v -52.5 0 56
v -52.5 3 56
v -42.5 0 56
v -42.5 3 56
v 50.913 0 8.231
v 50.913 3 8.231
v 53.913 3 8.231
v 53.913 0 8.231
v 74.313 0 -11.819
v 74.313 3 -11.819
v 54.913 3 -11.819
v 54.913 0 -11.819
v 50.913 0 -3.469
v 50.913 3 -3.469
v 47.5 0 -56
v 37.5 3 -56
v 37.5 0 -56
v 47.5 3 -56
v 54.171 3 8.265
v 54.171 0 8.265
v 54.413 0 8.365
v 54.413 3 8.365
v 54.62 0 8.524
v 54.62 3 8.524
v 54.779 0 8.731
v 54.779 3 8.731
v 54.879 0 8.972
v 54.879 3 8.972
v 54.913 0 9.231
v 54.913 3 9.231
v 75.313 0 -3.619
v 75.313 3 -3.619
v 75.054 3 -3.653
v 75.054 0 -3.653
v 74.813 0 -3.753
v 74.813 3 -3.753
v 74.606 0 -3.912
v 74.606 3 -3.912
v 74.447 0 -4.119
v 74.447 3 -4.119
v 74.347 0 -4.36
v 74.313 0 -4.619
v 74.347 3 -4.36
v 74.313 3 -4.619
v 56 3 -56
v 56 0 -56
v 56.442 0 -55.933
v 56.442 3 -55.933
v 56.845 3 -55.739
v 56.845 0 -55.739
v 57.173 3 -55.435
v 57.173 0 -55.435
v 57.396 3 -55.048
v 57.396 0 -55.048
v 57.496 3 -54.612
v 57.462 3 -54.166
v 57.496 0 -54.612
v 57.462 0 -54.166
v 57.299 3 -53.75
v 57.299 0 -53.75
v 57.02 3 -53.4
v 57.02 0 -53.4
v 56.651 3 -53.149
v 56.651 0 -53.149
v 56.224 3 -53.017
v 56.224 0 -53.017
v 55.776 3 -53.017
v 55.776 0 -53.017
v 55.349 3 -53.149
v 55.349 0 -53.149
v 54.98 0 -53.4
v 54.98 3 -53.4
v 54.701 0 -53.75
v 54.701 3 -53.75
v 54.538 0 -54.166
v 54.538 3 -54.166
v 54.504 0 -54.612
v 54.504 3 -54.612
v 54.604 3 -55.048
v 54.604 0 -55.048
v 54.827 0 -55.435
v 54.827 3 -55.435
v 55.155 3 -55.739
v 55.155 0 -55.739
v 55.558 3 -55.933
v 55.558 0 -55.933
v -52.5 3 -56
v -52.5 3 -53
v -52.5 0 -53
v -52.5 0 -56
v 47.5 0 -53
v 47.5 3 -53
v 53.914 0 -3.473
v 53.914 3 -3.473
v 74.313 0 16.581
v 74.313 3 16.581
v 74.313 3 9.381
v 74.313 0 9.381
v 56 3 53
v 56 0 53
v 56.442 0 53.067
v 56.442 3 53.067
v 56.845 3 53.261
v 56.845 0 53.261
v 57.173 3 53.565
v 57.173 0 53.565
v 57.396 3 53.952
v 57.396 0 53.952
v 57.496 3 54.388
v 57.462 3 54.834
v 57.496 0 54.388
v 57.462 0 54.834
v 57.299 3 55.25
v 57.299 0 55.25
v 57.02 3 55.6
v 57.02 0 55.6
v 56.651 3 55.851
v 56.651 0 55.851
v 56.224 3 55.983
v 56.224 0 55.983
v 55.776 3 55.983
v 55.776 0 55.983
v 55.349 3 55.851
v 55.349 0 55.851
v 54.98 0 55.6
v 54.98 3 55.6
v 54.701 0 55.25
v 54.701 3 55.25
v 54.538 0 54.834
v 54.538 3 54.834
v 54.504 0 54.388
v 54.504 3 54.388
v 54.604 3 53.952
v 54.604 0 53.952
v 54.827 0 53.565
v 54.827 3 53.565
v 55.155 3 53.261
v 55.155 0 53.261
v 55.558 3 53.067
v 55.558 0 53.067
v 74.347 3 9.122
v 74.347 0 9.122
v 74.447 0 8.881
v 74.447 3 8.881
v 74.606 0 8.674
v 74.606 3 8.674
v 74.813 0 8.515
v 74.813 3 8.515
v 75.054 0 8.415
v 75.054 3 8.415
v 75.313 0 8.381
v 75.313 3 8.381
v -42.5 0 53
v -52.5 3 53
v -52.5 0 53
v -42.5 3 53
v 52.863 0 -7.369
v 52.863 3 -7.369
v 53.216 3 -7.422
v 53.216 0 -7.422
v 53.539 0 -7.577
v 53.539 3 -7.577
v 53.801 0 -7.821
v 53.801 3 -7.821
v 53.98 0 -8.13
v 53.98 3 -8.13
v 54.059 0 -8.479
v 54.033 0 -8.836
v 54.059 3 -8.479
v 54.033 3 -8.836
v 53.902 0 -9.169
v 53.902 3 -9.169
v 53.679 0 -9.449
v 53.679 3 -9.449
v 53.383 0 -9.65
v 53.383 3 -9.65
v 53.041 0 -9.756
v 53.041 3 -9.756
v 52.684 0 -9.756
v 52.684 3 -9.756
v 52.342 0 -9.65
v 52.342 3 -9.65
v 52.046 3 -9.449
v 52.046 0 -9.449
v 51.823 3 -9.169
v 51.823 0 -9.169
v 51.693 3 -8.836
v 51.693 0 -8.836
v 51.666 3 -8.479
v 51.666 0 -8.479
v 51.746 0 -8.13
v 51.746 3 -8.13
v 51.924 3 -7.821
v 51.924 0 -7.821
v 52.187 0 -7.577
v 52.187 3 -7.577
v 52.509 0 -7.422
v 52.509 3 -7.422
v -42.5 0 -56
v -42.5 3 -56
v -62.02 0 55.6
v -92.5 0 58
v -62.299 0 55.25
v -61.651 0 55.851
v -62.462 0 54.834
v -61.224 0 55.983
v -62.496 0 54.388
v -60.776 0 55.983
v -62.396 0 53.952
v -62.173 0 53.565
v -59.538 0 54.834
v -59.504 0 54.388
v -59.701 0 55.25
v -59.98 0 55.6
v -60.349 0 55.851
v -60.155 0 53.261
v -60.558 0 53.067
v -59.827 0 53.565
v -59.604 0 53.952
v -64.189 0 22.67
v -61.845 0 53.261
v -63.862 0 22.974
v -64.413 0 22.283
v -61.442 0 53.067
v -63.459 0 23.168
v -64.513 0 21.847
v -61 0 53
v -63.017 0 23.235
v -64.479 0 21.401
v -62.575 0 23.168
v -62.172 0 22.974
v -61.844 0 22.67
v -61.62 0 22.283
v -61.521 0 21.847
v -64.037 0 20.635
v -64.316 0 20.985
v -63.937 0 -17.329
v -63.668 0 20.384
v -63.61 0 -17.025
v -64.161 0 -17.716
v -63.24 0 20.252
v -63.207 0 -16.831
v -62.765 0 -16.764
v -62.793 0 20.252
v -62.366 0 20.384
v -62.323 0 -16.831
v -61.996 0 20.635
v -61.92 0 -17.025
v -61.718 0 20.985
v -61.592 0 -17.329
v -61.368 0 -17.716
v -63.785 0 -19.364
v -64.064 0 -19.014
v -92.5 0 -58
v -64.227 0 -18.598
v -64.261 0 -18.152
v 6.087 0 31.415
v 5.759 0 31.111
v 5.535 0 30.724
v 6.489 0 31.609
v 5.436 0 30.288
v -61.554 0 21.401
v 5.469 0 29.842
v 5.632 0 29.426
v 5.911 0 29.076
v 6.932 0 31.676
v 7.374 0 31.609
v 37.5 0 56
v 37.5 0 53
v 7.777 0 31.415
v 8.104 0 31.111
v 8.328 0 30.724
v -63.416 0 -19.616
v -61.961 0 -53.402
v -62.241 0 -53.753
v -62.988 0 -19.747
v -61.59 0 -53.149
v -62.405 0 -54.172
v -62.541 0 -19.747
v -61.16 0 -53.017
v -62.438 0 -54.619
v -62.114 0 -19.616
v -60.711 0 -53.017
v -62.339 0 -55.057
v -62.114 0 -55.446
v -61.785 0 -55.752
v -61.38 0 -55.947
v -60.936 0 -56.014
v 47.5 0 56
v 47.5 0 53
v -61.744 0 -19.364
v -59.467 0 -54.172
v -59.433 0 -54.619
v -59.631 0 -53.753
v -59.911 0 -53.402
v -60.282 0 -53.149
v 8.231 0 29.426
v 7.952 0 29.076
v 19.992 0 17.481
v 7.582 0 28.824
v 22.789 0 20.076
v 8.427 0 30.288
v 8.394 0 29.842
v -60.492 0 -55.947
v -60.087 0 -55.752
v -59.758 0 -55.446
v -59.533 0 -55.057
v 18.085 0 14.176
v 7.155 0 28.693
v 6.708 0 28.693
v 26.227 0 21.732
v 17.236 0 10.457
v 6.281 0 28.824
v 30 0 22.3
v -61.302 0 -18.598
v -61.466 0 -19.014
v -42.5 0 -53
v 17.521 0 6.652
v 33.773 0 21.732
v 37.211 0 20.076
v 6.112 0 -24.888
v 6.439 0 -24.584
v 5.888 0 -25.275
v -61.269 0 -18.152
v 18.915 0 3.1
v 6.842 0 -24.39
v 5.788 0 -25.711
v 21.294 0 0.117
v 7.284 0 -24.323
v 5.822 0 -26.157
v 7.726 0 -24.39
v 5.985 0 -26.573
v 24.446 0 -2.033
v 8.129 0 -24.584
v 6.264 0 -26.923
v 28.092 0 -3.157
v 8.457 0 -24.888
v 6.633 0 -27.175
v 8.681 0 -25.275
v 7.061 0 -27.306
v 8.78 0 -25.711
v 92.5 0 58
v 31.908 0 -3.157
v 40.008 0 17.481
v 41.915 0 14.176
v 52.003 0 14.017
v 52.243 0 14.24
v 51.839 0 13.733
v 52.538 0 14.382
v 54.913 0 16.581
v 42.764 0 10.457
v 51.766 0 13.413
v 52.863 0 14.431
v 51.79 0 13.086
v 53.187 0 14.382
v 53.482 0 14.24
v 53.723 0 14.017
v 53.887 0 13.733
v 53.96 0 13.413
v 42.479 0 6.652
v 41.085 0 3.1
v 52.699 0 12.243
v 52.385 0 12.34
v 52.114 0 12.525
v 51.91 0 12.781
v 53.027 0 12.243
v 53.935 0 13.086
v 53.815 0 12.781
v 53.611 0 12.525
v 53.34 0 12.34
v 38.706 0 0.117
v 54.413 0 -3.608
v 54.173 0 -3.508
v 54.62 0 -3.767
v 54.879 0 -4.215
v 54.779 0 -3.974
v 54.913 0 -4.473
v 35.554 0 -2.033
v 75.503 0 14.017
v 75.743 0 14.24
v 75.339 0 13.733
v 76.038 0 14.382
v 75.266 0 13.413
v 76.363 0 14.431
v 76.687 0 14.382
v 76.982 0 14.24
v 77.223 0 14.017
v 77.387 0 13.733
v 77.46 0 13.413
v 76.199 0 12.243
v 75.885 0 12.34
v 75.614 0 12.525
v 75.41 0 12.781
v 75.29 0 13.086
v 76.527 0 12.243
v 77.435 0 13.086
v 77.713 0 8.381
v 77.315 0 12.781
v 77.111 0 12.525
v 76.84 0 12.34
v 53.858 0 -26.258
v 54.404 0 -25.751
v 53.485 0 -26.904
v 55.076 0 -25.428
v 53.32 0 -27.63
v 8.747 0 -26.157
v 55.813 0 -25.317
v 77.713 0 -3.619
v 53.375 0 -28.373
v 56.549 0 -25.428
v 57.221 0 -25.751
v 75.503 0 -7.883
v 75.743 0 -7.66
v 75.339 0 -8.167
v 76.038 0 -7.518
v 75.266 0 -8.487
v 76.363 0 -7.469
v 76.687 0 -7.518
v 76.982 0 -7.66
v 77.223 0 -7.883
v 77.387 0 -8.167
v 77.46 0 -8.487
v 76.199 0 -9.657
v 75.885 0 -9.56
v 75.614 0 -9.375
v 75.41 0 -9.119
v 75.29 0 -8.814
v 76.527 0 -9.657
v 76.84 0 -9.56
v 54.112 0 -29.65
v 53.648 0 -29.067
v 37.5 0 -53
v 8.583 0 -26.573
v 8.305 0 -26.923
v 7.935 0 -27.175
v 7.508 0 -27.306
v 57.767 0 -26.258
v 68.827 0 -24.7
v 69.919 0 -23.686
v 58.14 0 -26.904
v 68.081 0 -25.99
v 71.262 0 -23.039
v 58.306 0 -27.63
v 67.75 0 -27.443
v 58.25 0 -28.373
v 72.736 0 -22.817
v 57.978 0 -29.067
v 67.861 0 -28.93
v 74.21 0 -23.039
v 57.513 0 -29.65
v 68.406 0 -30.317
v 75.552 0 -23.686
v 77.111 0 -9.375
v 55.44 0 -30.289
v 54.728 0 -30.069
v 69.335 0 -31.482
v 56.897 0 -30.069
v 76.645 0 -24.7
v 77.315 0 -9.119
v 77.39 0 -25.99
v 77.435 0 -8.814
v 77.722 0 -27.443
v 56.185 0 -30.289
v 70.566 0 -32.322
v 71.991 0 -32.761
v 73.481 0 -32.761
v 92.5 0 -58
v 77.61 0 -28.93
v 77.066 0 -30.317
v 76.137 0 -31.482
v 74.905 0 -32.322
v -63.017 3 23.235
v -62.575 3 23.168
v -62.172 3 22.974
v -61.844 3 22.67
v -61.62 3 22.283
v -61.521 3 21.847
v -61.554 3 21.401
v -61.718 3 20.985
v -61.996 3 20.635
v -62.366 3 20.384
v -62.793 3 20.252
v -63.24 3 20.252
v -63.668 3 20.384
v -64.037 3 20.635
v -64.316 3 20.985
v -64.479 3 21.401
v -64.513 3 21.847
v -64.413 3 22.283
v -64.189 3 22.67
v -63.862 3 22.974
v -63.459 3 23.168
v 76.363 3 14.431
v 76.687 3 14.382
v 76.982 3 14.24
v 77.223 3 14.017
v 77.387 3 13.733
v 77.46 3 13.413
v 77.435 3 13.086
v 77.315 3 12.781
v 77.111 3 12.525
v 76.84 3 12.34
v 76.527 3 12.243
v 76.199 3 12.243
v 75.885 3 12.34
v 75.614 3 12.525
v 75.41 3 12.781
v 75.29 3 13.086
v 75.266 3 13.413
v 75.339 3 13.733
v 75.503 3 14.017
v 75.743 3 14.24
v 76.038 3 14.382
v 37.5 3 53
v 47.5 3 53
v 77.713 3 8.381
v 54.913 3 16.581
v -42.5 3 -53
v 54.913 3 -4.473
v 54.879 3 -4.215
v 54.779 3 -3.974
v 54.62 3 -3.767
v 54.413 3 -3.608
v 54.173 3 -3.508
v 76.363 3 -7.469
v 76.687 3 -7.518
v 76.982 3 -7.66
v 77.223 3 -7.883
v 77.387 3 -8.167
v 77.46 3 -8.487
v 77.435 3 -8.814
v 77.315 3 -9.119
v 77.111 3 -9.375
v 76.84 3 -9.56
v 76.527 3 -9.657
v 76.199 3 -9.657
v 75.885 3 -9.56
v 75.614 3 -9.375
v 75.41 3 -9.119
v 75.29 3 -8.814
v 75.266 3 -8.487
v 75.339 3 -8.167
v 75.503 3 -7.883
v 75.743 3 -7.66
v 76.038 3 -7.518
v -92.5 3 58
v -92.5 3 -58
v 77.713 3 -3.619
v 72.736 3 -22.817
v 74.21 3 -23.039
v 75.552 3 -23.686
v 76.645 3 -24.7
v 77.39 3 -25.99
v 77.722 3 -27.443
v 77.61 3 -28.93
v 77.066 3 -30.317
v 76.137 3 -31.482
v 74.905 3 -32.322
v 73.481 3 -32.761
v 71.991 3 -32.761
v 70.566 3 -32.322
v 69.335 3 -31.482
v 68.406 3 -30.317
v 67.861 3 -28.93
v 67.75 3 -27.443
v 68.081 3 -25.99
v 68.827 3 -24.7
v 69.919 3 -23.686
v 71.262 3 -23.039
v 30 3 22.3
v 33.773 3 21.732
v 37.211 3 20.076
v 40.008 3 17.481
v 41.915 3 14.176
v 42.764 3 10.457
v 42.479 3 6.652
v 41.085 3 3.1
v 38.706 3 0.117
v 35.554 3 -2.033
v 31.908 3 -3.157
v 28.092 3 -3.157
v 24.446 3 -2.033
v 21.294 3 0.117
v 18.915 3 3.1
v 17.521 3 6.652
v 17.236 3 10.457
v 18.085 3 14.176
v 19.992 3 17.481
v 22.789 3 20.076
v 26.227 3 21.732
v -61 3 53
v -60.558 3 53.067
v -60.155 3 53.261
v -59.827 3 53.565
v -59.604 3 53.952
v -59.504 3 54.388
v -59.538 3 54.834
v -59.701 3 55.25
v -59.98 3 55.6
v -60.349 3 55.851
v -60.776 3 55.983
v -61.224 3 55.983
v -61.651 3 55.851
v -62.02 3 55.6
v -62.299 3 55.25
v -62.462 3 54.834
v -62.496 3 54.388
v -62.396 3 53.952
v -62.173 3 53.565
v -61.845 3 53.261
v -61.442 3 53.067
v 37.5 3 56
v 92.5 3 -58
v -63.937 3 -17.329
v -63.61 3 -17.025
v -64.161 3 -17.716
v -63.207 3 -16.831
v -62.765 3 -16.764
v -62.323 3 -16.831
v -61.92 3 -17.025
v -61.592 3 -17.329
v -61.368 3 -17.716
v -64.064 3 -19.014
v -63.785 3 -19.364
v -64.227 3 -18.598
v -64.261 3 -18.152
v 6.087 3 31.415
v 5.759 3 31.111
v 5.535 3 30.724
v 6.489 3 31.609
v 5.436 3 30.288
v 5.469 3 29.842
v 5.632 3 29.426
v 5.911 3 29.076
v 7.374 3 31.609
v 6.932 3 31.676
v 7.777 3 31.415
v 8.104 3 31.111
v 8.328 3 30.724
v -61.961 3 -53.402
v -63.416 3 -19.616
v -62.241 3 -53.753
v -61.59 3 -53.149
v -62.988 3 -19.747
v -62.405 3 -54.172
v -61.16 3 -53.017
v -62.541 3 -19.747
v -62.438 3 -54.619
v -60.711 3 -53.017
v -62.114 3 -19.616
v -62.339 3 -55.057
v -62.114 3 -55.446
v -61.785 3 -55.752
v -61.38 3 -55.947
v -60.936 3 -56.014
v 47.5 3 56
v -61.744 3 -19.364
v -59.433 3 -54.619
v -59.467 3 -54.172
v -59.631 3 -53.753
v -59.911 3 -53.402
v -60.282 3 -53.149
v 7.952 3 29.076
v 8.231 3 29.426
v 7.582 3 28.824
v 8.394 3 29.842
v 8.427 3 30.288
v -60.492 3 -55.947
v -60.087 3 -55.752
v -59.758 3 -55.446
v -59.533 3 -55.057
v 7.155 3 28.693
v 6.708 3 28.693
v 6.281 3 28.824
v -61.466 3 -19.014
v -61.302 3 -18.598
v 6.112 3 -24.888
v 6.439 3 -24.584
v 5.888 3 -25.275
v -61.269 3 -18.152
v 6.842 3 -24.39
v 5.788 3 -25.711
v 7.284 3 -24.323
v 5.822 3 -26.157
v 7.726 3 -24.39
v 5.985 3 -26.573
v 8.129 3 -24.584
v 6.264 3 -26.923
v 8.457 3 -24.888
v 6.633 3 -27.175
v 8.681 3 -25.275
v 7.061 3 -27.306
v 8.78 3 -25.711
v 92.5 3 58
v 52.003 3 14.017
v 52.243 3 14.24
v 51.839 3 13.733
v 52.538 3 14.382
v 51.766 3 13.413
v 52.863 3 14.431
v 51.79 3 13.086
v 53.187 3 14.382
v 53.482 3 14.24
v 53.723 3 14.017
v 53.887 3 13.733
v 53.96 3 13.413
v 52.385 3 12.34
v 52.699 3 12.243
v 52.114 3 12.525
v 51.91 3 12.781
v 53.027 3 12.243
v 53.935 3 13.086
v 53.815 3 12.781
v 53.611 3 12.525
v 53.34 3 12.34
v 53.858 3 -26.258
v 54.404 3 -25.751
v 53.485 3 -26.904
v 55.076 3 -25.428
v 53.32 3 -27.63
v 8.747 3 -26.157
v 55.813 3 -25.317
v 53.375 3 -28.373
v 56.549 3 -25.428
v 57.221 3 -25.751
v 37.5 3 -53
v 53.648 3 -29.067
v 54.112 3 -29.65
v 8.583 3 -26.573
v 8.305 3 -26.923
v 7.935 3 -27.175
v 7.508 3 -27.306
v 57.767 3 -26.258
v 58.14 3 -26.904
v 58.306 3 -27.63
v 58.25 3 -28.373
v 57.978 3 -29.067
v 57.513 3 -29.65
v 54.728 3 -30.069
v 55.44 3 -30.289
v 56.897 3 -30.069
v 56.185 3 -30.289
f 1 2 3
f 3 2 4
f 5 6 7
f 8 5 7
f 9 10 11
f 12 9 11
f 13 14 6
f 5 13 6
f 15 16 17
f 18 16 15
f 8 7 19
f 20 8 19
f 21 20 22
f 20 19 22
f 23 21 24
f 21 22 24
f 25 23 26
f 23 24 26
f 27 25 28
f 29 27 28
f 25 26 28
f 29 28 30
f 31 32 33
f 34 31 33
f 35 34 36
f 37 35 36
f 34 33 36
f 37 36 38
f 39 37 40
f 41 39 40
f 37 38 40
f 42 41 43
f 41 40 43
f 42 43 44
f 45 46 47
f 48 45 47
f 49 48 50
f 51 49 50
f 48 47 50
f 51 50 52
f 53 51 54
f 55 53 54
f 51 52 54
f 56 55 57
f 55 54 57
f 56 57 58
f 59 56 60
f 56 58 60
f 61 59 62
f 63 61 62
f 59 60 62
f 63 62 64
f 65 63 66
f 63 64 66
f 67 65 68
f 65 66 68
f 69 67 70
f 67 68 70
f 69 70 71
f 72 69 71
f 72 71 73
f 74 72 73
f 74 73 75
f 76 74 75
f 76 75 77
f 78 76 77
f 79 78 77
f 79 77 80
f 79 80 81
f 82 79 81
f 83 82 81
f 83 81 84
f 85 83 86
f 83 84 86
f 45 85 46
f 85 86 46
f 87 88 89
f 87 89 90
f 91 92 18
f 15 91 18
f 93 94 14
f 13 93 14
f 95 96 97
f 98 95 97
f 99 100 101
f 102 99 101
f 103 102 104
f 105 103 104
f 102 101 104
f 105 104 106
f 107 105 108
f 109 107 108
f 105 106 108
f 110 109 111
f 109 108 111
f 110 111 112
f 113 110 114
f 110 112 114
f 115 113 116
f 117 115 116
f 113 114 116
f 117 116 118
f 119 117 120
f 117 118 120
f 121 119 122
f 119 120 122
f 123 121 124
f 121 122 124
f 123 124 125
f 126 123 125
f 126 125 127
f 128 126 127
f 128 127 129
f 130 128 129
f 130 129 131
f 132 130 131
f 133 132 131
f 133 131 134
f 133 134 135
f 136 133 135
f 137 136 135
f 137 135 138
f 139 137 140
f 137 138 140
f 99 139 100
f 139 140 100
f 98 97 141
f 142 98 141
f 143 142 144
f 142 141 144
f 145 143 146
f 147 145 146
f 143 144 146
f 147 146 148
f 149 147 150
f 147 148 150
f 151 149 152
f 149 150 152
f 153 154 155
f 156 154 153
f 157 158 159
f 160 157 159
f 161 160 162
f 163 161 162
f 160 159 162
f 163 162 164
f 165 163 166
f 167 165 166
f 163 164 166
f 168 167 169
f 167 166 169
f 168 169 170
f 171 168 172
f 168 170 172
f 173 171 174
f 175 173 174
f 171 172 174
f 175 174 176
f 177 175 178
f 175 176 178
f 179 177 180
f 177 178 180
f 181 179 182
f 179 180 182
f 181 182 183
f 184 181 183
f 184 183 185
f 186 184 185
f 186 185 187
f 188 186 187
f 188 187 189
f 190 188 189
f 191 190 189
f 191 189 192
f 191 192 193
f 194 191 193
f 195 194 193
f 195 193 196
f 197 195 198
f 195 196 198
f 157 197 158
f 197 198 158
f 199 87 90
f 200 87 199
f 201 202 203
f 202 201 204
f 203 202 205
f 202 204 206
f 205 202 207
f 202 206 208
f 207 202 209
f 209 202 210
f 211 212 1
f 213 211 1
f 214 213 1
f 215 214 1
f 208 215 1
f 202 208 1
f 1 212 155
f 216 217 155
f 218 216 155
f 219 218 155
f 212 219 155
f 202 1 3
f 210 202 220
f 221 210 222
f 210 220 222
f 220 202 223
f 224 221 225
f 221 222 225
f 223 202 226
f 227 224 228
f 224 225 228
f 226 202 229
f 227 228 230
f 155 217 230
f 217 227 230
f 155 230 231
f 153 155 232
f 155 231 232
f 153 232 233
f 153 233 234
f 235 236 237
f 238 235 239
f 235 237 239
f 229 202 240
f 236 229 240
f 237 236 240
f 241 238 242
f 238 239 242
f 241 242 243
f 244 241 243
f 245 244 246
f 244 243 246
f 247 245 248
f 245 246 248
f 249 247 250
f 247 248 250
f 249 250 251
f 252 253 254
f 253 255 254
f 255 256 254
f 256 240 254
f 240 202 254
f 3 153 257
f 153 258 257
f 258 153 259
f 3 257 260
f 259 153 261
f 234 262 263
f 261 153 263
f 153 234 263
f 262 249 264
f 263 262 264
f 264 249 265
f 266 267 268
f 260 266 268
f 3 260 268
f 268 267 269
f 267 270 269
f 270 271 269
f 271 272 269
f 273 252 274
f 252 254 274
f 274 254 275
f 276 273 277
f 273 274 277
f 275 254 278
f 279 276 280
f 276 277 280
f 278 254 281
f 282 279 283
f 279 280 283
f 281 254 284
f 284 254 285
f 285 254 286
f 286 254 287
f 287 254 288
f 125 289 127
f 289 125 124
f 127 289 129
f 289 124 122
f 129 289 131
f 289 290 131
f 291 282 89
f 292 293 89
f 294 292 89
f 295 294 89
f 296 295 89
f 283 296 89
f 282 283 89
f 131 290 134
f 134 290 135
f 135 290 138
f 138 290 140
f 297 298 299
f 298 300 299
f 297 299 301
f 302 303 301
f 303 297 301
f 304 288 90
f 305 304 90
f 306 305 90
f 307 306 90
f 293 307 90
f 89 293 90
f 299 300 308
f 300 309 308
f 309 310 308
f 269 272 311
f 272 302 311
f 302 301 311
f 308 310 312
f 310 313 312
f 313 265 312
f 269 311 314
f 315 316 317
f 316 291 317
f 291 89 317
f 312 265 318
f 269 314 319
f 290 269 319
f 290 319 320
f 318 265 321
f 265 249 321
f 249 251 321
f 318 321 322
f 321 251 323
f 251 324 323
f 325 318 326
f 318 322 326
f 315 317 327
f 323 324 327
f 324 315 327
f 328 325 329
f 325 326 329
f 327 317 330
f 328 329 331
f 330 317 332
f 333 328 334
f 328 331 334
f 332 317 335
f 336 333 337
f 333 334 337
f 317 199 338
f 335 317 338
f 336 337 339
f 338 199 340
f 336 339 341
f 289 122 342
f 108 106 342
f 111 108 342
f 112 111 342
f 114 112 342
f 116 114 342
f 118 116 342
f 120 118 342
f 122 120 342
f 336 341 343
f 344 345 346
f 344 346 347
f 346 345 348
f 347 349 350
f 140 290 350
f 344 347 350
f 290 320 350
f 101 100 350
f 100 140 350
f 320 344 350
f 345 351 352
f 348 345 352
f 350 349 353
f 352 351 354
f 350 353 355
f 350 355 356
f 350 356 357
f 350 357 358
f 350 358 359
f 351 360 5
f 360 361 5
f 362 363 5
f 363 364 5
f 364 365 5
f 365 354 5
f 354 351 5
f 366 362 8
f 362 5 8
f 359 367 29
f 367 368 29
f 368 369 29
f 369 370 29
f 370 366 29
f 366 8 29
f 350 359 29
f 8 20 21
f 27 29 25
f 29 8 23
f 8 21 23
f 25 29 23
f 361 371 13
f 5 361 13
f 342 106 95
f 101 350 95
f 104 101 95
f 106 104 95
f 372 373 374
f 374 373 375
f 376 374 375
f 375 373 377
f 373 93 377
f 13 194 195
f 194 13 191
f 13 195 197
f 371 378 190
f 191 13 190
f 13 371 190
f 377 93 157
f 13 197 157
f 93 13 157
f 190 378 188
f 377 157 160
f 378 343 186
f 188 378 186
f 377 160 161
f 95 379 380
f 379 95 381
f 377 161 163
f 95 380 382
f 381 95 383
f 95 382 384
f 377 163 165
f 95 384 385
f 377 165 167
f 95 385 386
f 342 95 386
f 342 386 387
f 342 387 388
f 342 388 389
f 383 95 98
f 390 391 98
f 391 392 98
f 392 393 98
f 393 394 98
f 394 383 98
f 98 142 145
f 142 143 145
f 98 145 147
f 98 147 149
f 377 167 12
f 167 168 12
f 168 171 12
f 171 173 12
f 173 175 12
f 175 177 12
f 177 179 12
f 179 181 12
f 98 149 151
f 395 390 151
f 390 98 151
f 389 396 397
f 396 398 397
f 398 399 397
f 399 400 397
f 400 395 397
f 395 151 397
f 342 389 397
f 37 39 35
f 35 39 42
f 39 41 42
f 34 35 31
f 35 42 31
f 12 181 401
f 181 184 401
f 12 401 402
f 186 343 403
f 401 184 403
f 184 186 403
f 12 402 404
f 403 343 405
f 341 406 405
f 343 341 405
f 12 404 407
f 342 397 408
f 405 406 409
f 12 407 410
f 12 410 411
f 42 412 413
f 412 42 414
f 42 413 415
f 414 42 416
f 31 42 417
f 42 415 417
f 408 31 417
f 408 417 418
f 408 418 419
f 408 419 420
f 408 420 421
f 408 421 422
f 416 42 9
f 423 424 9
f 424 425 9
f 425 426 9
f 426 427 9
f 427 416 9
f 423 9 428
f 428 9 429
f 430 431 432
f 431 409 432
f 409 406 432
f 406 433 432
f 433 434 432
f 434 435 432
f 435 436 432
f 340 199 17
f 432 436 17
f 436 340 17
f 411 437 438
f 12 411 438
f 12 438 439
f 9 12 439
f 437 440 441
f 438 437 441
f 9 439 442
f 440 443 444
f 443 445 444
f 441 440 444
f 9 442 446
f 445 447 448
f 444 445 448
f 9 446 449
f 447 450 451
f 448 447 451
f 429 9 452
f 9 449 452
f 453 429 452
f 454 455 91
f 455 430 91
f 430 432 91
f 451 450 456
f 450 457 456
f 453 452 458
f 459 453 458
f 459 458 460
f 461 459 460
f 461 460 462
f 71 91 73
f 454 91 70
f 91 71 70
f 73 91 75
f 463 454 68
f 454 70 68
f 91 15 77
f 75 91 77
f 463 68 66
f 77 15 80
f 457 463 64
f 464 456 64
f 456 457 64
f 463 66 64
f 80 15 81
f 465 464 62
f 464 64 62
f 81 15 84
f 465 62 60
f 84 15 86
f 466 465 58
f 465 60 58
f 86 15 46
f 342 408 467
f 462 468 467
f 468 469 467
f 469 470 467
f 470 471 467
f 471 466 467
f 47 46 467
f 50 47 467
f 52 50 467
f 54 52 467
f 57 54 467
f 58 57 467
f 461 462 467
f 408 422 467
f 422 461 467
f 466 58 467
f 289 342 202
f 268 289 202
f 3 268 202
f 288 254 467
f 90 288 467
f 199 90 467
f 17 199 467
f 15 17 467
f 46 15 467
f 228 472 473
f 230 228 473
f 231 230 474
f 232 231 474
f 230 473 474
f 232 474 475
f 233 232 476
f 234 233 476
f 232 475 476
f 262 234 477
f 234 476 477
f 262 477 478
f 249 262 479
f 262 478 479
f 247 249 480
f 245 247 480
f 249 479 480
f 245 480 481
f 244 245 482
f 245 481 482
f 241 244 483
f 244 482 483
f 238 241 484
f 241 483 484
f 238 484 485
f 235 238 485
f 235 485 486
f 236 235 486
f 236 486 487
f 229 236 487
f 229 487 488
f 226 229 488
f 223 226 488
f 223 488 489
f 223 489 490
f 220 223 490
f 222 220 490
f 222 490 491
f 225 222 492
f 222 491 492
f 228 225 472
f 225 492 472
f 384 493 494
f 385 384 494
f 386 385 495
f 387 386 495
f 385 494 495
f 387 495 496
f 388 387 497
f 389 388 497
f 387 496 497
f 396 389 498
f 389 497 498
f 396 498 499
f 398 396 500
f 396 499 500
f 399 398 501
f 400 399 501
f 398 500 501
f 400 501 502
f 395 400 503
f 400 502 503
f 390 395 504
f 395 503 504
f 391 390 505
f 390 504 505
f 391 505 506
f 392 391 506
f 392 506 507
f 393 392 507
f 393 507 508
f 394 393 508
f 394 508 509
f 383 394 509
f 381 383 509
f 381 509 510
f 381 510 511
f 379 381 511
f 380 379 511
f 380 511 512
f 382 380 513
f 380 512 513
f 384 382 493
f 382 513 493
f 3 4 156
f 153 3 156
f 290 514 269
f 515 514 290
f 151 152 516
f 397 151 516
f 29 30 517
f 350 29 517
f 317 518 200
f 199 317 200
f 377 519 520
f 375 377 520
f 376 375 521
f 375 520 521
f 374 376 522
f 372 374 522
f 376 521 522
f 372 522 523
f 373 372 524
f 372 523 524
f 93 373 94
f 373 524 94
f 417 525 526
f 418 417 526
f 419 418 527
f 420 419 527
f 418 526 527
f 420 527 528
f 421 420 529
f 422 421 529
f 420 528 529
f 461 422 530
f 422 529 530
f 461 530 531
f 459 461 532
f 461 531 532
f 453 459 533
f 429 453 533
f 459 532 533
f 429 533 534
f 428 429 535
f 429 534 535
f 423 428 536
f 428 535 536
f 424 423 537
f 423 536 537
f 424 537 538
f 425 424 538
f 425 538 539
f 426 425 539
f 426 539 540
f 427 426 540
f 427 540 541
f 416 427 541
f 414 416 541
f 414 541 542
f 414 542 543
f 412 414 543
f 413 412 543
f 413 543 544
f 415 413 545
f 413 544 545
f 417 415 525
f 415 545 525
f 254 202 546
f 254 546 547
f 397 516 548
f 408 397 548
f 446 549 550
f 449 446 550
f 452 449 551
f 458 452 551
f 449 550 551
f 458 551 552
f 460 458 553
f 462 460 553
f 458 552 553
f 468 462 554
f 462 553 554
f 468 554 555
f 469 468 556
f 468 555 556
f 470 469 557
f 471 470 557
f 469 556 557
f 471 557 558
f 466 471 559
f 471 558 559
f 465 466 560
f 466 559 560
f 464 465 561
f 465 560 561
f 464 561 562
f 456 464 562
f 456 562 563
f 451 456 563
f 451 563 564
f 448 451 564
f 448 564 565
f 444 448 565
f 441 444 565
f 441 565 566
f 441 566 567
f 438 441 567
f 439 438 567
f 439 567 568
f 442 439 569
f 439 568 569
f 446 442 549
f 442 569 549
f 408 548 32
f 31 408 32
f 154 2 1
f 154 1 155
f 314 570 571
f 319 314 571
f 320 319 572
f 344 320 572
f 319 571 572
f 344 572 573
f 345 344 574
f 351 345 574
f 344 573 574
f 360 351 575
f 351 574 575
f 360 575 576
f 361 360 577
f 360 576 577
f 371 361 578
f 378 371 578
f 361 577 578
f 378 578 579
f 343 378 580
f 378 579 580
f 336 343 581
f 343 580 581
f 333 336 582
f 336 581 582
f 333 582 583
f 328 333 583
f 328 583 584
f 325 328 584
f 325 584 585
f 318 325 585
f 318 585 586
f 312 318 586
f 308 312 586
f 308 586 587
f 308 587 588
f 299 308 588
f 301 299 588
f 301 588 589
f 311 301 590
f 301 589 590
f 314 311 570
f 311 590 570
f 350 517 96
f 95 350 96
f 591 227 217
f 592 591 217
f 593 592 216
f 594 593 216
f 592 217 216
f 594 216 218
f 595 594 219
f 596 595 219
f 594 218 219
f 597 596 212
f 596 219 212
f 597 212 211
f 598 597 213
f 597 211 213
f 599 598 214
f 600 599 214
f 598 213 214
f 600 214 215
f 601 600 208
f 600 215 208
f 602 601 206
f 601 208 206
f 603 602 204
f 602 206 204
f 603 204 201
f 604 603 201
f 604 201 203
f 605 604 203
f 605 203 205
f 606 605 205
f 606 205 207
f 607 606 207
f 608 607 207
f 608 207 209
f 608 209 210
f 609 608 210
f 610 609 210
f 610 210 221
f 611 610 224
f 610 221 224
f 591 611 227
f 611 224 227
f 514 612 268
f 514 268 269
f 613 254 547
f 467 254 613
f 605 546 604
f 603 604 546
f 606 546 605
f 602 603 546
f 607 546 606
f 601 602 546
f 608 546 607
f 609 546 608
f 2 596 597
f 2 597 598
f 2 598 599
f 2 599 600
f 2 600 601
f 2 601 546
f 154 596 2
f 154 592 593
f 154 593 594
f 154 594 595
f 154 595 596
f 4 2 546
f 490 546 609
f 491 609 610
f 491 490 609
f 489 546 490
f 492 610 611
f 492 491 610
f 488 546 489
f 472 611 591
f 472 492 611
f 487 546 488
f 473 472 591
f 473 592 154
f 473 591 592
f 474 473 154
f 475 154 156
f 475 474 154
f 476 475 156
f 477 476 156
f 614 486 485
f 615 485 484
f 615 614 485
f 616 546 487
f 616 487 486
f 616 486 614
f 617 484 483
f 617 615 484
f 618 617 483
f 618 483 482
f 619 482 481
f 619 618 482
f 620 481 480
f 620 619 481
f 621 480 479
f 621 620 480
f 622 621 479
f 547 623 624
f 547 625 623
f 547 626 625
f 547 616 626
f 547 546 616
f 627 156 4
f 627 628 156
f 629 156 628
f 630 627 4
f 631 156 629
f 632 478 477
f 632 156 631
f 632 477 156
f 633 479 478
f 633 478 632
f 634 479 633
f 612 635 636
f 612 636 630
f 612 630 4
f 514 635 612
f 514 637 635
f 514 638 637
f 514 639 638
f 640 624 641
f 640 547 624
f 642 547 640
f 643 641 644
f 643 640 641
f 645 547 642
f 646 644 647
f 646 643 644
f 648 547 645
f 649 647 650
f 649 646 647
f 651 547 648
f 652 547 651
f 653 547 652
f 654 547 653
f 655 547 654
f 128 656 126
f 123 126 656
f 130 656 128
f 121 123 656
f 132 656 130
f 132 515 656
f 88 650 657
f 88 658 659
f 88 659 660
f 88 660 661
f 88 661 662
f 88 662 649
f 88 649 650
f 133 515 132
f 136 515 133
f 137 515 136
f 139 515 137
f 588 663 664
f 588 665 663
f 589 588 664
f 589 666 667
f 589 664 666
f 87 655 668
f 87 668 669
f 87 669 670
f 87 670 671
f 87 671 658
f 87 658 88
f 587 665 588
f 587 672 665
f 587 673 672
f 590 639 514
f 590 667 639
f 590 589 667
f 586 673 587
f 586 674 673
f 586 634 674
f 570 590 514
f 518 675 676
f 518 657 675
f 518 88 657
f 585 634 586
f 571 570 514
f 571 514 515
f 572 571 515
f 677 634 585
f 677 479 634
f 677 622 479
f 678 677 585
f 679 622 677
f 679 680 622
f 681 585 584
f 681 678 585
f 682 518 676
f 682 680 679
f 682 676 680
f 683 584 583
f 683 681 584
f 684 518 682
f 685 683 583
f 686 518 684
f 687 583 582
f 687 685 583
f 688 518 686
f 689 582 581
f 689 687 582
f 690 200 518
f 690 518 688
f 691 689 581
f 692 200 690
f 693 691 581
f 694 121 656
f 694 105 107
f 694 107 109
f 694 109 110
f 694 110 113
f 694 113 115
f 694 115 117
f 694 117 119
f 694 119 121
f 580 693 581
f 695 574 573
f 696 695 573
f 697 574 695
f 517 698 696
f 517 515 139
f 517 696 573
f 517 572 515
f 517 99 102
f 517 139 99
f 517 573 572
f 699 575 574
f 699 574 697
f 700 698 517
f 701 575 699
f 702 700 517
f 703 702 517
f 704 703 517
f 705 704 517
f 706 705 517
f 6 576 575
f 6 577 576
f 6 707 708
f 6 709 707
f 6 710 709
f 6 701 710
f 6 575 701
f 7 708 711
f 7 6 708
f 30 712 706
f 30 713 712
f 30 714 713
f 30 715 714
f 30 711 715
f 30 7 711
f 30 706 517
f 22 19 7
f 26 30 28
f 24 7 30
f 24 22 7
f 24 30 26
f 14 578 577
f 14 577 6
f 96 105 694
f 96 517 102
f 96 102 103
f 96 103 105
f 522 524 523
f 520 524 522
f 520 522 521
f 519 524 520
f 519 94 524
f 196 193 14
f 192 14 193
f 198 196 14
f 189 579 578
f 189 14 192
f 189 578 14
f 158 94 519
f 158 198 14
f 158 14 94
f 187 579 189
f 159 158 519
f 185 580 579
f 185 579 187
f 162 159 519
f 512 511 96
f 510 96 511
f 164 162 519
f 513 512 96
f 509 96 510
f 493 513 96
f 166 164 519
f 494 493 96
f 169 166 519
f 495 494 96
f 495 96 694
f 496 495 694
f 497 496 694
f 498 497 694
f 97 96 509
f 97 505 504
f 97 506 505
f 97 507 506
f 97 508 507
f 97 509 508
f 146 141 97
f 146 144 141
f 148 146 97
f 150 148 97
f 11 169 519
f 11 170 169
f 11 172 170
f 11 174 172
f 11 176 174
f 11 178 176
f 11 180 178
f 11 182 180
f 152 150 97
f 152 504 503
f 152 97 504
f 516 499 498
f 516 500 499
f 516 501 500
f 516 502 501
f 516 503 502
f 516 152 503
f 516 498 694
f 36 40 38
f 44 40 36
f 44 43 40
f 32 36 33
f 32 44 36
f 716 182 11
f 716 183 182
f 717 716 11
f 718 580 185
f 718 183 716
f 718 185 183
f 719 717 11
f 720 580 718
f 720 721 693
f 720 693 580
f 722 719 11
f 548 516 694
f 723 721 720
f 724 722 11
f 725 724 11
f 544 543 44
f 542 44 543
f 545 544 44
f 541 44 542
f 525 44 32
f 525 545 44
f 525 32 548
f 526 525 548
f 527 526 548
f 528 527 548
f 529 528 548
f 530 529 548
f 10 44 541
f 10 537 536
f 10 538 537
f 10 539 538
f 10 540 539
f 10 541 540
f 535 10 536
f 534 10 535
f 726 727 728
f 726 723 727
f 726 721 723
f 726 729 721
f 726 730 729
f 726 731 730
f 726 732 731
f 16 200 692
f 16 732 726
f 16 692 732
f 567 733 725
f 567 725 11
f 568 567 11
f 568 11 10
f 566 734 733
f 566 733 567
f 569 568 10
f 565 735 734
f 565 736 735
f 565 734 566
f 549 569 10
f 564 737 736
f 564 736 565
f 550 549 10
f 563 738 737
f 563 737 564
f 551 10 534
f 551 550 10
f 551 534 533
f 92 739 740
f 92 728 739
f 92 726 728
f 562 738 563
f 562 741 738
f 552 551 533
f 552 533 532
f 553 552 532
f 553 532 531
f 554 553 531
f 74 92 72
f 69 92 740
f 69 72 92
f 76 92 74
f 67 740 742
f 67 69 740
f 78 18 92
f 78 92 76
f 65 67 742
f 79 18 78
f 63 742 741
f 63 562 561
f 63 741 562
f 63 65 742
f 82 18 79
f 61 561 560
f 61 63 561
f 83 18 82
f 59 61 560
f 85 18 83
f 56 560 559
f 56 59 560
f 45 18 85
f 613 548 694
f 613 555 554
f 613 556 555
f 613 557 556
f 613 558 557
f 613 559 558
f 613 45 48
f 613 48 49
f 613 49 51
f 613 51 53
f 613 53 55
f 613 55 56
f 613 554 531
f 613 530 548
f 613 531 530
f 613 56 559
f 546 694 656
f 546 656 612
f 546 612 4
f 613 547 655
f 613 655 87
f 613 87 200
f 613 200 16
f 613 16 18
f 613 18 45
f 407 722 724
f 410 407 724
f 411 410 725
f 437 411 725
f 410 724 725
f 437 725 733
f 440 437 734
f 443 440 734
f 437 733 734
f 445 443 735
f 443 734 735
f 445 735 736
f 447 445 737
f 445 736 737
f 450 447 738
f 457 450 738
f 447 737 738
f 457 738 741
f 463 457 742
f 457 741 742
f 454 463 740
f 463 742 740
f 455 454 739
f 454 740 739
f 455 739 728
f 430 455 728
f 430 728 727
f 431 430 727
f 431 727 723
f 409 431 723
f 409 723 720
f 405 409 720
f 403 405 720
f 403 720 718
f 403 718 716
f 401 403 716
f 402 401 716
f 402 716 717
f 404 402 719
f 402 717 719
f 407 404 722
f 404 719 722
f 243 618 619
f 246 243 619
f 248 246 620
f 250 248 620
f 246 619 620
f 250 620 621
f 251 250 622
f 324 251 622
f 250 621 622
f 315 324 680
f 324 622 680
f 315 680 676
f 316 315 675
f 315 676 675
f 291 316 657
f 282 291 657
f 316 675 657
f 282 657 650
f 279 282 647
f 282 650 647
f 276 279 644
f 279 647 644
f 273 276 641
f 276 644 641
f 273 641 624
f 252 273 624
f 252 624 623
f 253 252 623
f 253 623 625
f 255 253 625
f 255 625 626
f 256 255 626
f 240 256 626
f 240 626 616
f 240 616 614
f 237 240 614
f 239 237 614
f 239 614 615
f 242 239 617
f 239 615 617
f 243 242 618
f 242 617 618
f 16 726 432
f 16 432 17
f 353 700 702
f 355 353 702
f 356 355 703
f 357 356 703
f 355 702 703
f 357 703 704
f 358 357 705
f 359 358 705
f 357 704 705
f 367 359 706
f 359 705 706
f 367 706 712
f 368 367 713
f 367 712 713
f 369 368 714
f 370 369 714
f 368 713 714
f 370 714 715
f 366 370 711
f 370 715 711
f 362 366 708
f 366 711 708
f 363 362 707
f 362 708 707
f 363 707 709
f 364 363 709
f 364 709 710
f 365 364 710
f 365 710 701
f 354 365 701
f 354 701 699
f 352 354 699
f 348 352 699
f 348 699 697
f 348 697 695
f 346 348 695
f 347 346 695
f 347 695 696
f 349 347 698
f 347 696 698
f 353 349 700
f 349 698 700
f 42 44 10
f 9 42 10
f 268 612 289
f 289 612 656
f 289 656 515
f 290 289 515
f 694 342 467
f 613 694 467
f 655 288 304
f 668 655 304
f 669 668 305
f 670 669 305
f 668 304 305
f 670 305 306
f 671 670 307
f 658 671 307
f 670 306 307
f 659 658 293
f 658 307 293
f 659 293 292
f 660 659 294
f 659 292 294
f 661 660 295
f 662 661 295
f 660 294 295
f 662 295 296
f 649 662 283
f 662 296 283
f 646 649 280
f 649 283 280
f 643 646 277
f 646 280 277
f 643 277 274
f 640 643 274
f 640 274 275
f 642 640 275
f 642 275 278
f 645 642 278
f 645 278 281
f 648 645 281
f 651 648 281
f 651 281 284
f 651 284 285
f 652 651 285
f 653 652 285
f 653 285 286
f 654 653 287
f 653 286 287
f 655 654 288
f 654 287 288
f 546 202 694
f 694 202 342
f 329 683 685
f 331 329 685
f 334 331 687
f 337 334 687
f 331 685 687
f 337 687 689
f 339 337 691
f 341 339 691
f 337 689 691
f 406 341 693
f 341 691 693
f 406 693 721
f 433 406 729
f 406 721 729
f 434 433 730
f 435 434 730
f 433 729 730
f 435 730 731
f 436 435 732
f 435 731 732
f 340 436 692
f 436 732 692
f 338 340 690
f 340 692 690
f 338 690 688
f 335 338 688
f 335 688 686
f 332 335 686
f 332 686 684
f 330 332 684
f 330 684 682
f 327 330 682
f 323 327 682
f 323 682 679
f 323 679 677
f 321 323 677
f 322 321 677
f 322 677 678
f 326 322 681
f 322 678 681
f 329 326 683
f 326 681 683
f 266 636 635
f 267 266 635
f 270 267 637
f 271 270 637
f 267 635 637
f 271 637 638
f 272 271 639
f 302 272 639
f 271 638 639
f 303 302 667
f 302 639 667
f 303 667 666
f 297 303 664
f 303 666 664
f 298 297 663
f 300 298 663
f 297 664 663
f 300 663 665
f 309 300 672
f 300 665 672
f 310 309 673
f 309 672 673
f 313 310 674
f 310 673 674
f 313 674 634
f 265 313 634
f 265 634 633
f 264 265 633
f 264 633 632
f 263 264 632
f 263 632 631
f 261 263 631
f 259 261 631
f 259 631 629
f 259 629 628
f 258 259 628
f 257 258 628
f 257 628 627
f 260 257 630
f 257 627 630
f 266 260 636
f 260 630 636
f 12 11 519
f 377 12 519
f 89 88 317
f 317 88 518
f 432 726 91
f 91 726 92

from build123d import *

# Parameters (mm, degrees)
SKETCH1_W           = 185
SKETCH1_H           = 116
BOSS_EXTRUDE1_DEPTH = 3
SKETCH8_R           = 1.5
CUT_EXTRUDE3_DEPTH  = 3
SKETCH10_R          = 1.2
SKETCH10_R_2        = 1.1
SKETCH10_R_3        = 2.5
SKETCH10_R_4        = 5
SKETCH10_R_5        = 12.80026957
CUT_EXTRUDE6_DEPTH  = 3
SKETCH11_W          = 10
SKETCH11_H          = 3
CUT_EXTRUDE7_DEPTH  = 3
SKETCH13_R          = 1.5
SKETCH13_R_2        = 1.506866353
CUT_EXTRUDE8_DEPTH  = 3


with BuildPart() as part:
    # Sketch1 → Boss-Extrude1 (new body)
    with BuildSketch(Plane(origin=(0, 0, 0), x_dir=(1, 0, 0), z_dir=(0, 1, 0))):
        Rectangle(SKETCH1_W, SKETCH1_H)
    extrude(amount=BOSS_EXTRUDE1_DEPTH)

    # Sketch8 → Cut-Extrude3 (cut)
    with BuildSketch(Plane(origin=(0, 3, 0), x_dir=(1, 0, 0), z_dir=(0, 1, 0))):
        with Locations(Location((-62.764720309, 18.264176016, 0), (0, 0, 270))):
            Circle(SKETCH8_R)
        with Locations(Location((-63.016694441, -21.735030339, 0), (0, 0, 270))):
            Circle(SKETCH8_R)
        with Locations(Location((7.284285639, 25.823062556, 0), (0, 0, 270))):
            Circle(SKETCH8_R)
        with Locations(Location((6.931521854, -30.175826341, 0), (0, 0, 270))):
            Circle(SKETCH8_R)
    extrude(amount=-CUT_EXTRUDE3_DEPTH, mode=Mode.SUBTRACT)

    # Sketch10 → Cut-Extrude6 (cut)
    with BuildSketch(Plane(origin=(0, 3, 0), x_dir=(1, 0, 0), z_dir=(0, 1, 0))):
        with Locations(Location((52.862616564, 8.568904476, 0), (0, 0, 270))):
            Circle(SKETCH10_R)
        with Locations(Location((52.862616564, -13.331095524, 0), (0, 0, 270))):
            Circle(SKETCH10_R_2)
        with Locations(Location((76.362616564, -13.331095524, 0), (0, 0, 270))):
            Circle(SKETCH10_R_2)
        with Locations(Location((76.362616564, 8.568904476, 0), (0, 0, 270))):
            Circle(SKETCH10_R_2)
        with Locations(Location((55.812578484, 27.817001132, 0), (0, 0, 270))):
            Circle(SKETCH10_R_3)
        with Locations(Location((72.735814959, 27.817001132, 0), (0, 0, 270))):
            Circle(SKETCH10_R_4)
        with Locations(Location((30, -9.5, 0), (0, 0, 270))):
            Circle(SKETCH10_R_5)
        with BuildLine():
            Line((50.912616564, -8.231095524), (53.912616564, -8.231095524))
            ThreePointArc((53.912616564, -8.231095524), (54.619723345, -8.523988743), (54.912616564, -9.231095524))
            Line((54.912616564, -9.231095524), (54.912616564, -16.581095524))
            Line((54.912616564, -16.581095524), (74.312616564, -16.581095524))
            Line((74.312616564, -16.581095524), (74.312616564, -9.381095524))
            ThreePointArc((74.312616564, -9.381095524), (74.605509783, -8.673988743), (75.312616564, -8.381095524))
            Line((75.312616564, -8.381095524), (77.712616564, -8.381095524))
            Line((77.712616564, -8.381095524), (77.712616564, 3.618904476))
            Line((77.712616564, 3.618904476), (75.312616564, 3.618904476))
            ThreePointArc((75.312616564, 3.618904476), (74.605509783, 3.911797695), (74.312616564, 4.618904476))
            Line((74.312616564, 4.618904476), (74.312616564, 11.818904476))
            Line((74.312616564, 11.818904476), (54.912616564, 11.818904476))
            Line((54.912616564, 11.818904476), (54.912616564, 4.473317322))
            ThreePointArc((54.912616564, 4.473317322), (54.620243085, 3.766730663), (53.914087151, 3.473318403))
            Line((53.914087151, 3.473318403), (50.912616564, 3.468904476))
            Line((50.912616564, 3.468904476), (50.912616564, -8.231095524))
        make_face()
    extrude(amount=-CUT_EXTRUDE6_DEPTH, mode=Mode.SUBTRACT)

    # Sketch11 → Cut-Extrude7 (cut)
    with BuildSketch(Plane(origin=(0, 3, 0), x_dir=(1, 0, 0), z_dir=(0, 1, 0))):
        with Locations((-47.5, 54.5)):
            Rectangle(SKETCH11_W, SKETCH11_H)
        with Locations((42.5, 54.5)):
            Rectangle(SKETCH11_W, SKETCH11_H)
        with Locations((-47.5, -54.5)):
            Rectangle(SKETCH11_W, SKETCH11_H)
        with Locations((42.5, -54.5)):
            Rectangle(SKETCH11_W, SKETCH11_H)
    extrude(amount=-CUT_EXTRUDE7_DEPTH, mode=Mode.SUBTRACT)

    # Sketch13 → Cut-Extrude8 (cut)
    with BuildSketch(Plane.XZ):
        with Locations(Location((56, -54.5, 0), (0, 0, 270))):
            Circle(SKETCH13_R)
        with Locations(Location((-60.935816723, -54.506866353, 0), (0, 0, 270))):
            Circle(SKETCH13_R_2)
        with Locations(Location((-61, 54.5, 0), (0, 0, 270))):
            Circle(SKETCH13_R)
        with Locations(Location((56, 54.5, 0), (0, 0, 270))):
            Circle(SKETCH13_R)
    extrude(amount=-CUT_EXTRUDE8_DEPTH, mode=Mode.SUBTRACT)


solid = part.part
